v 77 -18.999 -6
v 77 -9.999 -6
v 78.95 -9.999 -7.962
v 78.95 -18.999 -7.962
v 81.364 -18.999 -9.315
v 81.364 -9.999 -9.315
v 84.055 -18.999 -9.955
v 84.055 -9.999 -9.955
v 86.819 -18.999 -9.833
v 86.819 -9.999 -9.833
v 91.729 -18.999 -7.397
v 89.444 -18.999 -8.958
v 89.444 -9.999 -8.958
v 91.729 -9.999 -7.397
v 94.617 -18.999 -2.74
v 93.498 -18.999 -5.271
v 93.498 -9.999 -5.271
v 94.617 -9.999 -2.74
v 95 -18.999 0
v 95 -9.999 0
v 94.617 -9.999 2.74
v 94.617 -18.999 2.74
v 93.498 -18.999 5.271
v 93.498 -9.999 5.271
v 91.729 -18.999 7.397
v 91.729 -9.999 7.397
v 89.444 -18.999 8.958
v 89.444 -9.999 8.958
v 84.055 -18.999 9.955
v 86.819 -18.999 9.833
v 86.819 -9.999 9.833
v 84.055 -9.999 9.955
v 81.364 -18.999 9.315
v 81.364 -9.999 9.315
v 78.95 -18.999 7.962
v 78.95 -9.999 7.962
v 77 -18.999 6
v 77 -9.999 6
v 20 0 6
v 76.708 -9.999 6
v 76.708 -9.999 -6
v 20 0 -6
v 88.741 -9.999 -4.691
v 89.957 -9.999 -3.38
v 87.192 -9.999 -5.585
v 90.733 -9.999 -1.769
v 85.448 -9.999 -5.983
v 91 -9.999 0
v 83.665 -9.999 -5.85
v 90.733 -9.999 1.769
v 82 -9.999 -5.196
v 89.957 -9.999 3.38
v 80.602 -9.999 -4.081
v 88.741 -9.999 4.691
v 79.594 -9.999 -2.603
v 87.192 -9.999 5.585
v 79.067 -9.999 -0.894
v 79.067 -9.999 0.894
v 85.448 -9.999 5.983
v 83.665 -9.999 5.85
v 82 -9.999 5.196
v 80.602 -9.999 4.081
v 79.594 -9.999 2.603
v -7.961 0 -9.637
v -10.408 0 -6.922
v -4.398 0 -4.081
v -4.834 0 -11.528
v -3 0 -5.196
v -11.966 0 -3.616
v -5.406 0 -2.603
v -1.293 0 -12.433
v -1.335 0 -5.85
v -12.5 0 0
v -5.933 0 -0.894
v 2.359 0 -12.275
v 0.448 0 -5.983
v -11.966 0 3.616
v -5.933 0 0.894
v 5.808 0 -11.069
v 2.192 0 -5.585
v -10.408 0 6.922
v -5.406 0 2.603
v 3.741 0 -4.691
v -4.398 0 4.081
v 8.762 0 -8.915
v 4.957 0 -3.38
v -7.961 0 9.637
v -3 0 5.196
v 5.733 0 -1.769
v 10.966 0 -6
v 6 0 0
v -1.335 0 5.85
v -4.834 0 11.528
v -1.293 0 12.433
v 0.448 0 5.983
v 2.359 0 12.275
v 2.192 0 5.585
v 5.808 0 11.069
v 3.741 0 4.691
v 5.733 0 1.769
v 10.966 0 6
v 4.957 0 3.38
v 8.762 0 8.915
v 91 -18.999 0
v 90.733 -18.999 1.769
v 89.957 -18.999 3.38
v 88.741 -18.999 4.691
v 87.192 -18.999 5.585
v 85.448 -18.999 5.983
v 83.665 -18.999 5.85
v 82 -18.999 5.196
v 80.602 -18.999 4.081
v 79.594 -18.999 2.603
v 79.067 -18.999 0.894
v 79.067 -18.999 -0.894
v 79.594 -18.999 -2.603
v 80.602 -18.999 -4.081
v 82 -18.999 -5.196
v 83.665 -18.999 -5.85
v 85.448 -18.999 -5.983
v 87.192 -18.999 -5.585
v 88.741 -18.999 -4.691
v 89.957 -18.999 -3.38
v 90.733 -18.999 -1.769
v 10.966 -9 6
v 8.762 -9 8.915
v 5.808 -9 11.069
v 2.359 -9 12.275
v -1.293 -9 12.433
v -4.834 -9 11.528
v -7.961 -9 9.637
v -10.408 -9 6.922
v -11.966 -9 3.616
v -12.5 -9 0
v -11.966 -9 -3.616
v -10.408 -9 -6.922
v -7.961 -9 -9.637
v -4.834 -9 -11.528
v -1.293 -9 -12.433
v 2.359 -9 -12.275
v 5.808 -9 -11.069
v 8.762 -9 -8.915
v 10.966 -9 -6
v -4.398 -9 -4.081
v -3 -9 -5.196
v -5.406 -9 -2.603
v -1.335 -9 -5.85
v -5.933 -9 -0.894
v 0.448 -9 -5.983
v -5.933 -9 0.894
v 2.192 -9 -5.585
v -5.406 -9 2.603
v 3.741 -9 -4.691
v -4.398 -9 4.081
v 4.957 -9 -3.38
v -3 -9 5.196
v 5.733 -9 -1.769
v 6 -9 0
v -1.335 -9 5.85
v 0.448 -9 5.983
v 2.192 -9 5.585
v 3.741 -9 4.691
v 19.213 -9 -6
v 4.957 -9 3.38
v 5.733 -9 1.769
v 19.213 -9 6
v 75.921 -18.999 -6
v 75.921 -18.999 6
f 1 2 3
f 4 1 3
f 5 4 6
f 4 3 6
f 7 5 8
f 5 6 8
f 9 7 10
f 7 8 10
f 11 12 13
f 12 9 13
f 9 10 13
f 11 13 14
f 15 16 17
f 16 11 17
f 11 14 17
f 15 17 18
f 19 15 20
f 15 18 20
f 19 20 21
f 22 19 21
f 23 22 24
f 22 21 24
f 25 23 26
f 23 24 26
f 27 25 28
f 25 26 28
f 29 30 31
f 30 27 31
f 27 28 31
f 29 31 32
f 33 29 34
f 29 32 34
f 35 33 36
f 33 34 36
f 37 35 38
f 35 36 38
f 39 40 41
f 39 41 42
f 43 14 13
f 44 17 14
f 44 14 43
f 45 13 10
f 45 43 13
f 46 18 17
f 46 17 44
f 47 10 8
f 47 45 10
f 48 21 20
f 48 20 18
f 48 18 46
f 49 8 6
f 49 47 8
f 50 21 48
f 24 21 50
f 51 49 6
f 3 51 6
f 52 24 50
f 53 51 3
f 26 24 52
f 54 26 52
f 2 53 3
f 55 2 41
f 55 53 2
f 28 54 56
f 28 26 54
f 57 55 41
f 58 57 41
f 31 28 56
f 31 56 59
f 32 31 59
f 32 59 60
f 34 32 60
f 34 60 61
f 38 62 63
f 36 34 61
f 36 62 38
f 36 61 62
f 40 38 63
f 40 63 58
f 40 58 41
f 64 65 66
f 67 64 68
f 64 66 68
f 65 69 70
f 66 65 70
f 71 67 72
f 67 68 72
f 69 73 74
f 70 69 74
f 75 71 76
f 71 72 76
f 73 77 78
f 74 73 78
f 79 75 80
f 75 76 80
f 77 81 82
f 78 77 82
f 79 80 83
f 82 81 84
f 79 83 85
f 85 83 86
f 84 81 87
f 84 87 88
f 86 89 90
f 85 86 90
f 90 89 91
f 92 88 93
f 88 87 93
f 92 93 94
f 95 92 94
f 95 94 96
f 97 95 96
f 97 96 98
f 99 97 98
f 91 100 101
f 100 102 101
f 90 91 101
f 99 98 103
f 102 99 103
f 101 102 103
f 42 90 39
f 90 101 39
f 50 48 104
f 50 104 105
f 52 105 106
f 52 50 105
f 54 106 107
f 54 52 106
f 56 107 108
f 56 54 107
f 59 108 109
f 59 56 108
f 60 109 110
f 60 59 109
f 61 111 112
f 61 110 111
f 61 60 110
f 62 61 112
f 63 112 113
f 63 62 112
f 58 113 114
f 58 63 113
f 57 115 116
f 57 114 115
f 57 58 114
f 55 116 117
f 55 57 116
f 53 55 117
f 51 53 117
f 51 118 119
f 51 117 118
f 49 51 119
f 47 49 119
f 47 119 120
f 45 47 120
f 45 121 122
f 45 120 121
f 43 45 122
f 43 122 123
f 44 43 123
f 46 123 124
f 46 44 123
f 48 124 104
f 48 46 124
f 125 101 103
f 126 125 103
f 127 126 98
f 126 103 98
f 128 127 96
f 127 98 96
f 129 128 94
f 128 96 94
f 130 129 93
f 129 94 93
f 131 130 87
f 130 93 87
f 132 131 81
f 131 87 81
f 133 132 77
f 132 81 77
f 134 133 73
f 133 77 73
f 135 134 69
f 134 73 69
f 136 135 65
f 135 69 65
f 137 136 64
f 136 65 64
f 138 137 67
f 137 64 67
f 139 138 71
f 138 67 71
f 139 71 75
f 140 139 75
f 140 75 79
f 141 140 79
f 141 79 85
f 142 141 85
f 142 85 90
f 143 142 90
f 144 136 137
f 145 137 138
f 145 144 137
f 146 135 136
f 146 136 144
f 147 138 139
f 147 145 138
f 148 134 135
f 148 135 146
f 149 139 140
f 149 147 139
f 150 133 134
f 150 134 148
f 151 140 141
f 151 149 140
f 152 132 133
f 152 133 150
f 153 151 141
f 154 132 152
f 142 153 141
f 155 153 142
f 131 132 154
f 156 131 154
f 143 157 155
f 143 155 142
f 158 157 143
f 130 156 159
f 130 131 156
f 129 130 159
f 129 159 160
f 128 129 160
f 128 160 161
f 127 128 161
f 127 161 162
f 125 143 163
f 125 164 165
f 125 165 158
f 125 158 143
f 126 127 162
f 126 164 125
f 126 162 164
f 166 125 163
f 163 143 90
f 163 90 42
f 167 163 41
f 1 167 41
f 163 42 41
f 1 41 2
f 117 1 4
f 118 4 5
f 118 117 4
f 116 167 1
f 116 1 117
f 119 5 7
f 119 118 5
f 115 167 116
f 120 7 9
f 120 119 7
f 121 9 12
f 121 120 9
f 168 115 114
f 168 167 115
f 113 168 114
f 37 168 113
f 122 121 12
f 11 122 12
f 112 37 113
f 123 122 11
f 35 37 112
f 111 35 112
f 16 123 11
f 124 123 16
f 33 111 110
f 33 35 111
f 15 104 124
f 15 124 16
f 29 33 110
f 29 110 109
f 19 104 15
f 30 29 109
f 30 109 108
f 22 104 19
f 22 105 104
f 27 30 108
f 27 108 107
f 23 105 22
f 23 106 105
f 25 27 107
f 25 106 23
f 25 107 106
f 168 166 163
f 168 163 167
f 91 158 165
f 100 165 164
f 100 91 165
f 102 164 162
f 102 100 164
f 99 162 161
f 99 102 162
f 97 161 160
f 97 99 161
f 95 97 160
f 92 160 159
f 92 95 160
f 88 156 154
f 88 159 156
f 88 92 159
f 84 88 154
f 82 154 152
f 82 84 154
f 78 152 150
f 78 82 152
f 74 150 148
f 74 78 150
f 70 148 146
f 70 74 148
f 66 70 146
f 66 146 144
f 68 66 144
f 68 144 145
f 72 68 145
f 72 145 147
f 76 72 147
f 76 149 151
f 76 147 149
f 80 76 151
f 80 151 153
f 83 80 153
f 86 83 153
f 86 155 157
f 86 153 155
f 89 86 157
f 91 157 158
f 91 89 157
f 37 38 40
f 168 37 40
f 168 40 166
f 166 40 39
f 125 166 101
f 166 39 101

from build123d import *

# Parameters (mm, degrees)
F0_R     = 6
F1_DEPTH = 25
F3_DEPTH = 12.5


with BuildPart() as f1:
    # F0 (on Front) → F1 (new body)
    with BuildSketch(Plane.XZ):
        with BuildLine():
            ThreePointArc((10.965856, -6), (12.110392, -3.096514), (12.5, 0))
            ThreePointArc((12.5, 0), (12.110392, 3.096514), (10.965856, 6))
            ThreePointArc((10.965856, 6), (-12.5, 0), (10.965856, -6))
        make_face()
        Circle(F0_R, mode=Mode.SUBTRACT)
        with BuildLine():
            ThreePointArc((10.965856, 6), (12.110392, 3.096514), (12.5, 0))
            ThreePointArc((12.5, 0), (12.110392, -3.096514), (10.965856, -6))
            Line((10.965856, -6), (77, -6))
            ThreePointArc((77, -6), (75, 0), (77, 6))
            Line((77, 6), (10.965856, 6))
        make_face()
        with BuildLine():
            ThreePointArc((95, 0), (88.162278, 9.486833), (77, 6))
            ThreePointArc((77, 6), (75, 0), (77, -6))
            ThreePointArc((77, -6), (88.162278, -9.486833), (95, 0))
        make_face()
        with Locations((85, 0)):
            Circle(F0_R, mode=Mode.SUBTRACT)
    extrude(amount=F1_DEPTH)

    # F2 (on Top) → F3 (intersect, symmetric)
    with BuildSketch(Plane.XY):
        Polygon((20, 0), (-12.5, 0), (-12.5, -9), (19.212602, -9), (75.92079, -18.999184), (95, -18.999184), (95, -9.999184), (76.708188, -9.999184), align=None)
    extrude(amount=F3_DEPTH, both=True, mode=Mode.INTERSECT)


solid = f1.part
